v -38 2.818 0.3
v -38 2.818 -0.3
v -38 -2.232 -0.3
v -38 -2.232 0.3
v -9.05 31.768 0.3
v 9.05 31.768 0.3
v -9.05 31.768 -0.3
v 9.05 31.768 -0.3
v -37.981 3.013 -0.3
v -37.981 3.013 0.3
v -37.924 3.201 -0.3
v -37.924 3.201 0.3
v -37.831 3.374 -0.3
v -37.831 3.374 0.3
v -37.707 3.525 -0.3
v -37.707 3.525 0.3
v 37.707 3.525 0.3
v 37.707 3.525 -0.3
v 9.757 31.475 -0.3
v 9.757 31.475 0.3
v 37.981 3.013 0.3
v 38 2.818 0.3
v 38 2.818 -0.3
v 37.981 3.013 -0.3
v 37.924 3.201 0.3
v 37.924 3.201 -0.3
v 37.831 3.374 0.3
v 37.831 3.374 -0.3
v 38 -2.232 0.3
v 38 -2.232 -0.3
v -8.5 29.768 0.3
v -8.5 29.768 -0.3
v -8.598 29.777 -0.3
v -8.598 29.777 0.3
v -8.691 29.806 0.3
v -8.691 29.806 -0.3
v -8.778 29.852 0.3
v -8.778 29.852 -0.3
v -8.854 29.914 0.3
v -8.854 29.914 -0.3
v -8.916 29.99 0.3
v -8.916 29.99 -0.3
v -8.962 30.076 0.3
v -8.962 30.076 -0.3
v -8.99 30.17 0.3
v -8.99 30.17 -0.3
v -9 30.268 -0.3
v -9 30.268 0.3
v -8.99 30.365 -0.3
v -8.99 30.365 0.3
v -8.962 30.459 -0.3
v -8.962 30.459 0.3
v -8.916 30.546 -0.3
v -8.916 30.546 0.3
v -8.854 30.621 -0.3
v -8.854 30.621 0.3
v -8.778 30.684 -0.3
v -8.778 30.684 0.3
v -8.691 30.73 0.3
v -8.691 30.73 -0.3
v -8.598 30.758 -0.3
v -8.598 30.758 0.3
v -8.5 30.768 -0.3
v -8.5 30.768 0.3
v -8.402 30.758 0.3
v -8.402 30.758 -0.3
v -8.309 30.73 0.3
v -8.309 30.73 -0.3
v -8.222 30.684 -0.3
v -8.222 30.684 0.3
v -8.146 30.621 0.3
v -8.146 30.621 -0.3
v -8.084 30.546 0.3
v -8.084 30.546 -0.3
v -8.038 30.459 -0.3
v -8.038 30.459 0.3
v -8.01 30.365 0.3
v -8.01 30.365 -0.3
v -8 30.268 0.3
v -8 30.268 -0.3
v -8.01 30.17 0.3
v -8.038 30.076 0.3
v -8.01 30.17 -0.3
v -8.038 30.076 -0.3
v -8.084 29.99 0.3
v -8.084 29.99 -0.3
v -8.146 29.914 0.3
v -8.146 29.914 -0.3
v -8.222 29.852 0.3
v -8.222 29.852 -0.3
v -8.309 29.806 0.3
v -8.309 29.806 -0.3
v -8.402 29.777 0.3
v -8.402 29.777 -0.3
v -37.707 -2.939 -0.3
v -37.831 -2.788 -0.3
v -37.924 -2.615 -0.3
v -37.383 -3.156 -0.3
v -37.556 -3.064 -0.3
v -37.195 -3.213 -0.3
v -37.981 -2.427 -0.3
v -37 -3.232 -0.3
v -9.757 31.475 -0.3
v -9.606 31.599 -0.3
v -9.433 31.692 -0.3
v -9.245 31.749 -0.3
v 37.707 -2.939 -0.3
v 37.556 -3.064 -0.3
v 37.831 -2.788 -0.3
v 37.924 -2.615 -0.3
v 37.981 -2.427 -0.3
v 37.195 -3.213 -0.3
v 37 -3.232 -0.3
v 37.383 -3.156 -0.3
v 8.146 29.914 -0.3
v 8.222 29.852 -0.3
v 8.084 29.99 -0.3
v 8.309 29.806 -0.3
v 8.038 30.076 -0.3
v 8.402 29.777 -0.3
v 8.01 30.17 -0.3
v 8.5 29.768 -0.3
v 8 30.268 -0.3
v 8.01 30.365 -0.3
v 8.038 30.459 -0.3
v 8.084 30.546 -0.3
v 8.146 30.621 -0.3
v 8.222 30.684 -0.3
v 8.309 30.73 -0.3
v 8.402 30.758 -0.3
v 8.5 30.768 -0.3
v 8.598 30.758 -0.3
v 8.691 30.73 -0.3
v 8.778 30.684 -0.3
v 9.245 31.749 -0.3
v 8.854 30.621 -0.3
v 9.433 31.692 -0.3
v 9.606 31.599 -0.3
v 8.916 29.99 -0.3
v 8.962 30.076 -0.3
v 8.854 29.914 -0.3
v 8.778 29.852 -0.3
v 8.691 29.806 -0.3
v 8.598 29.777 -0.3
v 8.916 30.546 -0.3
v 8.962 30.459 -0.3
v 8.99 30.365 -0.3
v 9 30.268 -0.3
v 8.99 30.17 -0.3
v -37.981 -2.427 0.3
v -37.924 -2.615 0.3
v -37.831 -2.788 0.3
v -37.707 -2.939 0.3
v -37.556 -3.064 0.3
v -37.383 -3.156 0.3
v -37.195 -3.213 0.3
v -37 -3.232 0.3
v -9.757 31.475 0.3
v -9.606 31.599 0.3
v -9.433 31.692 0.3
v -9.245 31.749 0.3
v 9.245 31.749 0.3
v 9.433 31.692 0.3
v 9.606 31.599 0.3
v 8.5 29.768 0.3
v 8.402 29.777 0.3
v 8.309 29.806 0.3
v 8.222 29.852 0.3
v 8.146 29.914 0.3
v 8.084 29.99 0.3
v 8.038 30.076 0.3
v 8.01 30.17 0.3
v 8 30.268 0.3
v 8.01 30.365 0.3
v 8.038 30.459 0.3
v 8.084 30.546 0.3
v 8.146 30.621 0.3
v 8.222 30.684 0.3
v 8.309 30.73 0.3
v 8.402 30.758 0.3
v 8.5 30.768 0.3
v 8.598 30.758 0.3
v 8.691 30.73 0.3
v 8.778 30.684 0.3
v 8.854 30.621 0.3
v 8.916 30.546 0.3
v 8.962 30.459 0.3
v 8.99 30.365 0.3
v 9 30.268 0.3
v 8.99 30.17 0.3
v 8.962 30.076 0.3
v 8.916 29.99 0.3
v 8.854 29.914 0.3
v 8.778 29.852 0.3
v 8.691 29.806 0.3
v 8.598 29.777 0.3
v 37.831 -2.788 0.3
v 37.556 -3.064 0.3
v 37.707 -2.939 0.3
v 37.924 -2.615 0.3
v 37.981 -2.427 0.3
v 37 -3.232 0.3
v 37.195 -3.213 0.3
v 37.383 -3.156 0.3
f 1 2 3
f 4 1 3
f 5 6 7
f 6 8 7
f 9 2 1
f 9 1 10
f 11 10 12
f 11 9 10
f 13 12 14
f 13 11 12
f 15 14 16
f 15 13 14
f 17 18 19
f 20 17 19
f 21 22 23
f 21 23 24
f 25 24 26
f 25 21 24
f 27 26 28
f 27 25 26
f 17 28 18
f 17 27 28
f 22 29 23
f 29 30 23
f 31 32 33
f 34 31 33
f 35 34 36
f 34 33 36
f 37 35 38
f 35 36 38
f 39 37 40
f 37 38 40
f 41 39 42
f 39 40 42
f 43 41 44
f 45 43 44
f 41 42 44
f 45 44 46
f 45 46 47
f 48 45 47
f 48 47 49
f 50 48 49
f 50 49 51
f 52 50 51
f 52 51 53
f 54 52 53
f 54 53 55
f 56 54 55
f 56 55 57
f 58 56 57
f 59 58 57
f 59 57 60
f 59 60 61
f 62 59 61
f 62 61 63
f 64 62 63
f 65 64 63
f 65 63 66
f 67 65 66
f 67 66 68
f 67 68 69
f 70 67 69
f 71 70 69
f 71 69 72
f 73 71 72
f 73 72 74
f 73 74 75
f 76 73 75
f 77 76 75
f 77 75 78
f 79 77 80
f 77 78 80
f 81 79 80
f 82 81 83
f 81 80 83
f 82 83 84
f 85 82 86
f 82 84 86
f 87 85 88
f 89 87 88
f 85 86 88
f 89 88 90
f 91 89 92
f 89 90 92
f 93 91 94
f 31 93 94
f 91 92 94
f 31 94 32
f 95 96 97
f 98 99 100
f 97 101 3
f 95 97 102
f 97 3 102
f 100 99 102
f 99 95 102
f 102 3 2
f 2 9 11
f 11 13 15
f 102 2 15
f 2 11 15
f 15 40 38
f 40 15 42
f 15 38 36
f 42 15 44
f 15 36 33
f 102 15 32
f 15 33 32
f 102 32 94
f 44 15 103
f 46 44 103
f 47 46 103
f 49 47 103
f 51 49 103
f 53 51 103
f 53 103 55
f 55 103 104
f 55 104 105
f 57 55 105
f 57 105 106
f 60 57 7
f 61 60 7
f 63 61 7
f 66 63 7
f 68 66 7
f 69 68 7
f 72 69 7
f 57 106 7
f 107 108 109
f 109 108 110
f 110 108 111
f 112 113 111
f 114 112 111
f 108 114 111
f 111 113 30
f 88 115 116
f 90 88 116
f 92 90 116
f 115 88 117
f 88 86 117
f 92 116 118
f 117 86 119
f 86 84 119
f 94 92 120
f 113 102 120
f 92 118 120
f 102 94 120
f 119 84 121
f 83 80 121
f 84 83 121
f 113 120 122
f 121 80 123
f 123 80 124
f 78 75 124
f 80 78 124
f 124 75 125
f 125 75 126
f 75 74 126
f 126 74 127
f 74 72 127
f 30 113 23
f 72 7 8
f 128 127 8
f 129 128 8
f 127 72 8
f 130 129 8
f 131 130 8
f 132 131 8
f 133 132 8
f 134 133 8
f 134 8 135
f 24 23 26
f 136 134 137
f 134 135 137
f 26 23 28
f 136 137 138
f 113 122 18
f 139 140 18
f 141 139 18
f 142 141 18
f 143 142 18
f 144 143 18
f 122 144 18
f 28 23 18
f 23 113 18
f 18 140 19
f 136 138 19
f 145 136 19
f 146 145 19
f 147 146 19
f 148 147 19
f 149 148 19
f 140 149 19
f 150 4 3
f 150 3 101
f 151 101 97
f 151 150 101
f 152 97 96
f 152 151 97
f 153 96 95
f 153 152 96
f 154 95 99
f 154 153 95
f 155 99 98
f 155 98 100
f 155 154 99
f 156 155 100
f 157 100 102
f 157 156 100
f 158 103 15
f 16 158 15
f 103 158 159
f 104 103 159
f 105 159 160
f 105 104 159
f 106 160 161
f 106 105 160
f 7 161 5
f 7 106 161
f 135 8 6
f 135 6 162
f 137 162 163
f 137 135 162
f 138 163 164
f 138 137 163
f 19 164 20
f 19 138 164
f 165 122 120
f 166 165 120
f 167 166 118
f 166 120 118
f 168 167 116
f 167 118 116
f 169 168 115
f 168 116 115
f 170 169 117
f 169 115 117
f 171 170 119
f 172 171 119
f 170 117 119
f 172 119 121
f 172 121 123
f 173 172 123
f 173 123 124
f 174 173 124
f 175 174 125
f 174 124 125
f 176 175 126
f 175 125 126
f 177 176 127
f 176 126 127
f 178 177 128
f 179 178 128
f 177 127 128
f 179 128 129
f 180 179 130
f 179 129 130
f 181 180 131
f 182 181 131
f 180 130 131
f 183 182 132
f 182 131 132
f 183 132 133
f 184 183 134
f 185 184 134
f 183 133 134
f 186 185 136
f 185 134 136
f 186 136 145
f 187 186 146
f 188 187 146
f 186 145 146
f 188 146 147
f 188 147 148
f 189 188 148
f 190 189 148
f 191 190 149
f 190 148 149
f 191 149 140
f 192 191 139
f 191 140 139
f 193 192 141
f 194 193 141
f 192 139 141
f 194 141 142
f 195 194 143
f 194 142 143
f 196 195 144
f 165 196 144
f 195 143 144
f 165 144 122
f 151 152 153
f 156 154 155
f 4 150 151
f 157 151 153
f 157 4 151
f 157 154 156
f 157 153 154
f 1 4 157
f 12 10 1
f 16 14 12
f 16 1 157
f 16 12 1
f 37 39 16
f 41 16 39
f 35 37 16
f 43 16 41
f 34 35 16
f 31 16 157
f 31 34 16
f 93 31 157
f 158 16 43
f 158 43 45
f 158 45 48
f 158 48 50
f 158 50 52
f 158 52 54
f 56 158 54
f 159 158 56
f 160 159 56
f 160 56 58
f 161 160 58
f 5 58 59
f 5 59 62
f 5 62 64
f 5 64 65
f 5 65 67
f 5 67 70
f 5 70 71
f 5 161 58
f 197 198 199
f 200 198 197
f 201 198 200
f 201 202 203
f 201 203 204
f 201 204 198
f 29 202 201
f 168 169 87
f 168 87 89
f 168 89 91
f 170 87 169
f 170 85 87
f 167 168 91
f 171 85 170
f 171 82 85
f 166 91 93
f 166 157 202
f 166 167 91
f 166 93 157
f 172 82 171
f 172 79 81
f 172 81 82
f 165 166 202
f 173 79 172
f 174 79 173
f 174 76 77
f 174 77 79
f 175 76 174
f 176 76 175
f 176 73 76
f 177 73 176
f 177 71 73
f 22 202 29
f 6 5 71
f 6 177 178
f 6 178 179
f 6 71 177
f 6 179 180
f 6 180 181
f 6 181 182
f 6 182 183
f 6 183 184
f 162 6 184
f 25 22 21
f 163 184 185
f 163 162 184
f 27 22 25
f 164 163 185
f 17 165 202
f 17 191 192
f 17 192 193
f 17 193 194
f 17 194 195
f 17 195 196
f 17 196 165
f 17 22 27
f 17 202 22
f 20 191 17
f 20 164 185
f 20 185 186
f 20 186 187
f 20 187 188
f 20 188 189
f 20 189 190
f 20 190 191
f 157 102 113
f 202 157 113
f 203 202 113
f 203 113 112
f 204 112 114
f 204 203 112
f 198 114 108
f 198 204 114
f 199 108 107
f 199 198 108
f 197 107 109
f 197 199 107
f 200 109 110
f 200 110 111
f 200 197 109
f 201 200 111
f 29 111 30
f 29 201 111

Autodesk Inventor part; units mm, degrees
ref_plane "YZ Plane" through (0, 0, 0) normal (1, 0, 0) x (0, 1, 0)
ref_plane "XZ Plane" through (0, 0, 0) normal (0, 1, 0) x (-1, 0, 0)
ref_plane "XY Plane" through (0, 0, 0) normal (0, 0, 1) x (1, 0, 0)
sketch "Sketch1" plane through (0, 0, 0) normal (0, 0, 1) x (1, 0, 0)
  line L0 (-38, -3.2322) -> (38, -3.2322)
  line L1 (38, -3.2322) -> (38, 3.2322)
  line L2 (38, 3.2322) -> (9.4645, 31.7678)
  line L3 (9.4645, 31.7678) -> (-9.4645, 31.7678)
  line L4 (-9.4645, 31.7678) -> (-38, 3.2322)
  line L5 (-38, 3.2322) -> (-38, -3.2322)
  line L6 (-48, -3.2322) -> (48, -3.2322) construction
  line L7 (48, -3.2322) -> (0, 44.7678) construction
  line L8 (0, 44.7678) -> (-48, -3.2322) construction
  point P0 (0, 0)
  point P1 (0, -3.2322)
  point P2 (0, 31.7678)
  point P3 (38, 0)
  dimension "d0" = 76
  dimension "d1" = 96
  dimension "d2" = 2.5
  dimension "d3" = 35
extrude "Extrusion1" add sketch "Sketch1" along normal mid plane 0.6
sketch "Sketch4" plane through (0, 0, 0.3) normal (0, 0, 1) x (1, 0, 0)
  line L0 (-38, -3.2322) -> (38, -3.2322) projected
  line L1 (38, -3.2322) -> (38, 3.2322) projected
  line L2 (38, 3.2322) -> (9.4645, 31.7678) projected
  line L3 (9.4645, 31.7678) -> (-9.4645, 31.7678) projected
  line L4 (-9.4645, 31.7678) -> (-38, 3.2322) projected
  line L5 (-38, 3.2322) -> (-38, -3.2322) projected
  line L6 (-8.5, 30.2678) -> (8.5, 30.2678) construction
  point P0 (0, 0)
  point P1 (0, 30.2678)
  dimension "d19" = 17
  dimension "d20" = 33.5
hole "Hole1" at (-8.5, 30.2678, 0.3) at (8.5, 30.2678, 0.3) direction (0, 0, -1) diameter 1 end through all
fillet "Fillet1" radius 1 6 edges at (38, -3.2322, 0) (38, 3.2322, 0) (9.4645, 31.7678, 0) (-9.4645, 31.7678, 0) (-38, 3.2322, 0) (-38, -3.2322, 0)
properties part number "-ZPanel_PCBExtender" material "Epoxy Resin"
